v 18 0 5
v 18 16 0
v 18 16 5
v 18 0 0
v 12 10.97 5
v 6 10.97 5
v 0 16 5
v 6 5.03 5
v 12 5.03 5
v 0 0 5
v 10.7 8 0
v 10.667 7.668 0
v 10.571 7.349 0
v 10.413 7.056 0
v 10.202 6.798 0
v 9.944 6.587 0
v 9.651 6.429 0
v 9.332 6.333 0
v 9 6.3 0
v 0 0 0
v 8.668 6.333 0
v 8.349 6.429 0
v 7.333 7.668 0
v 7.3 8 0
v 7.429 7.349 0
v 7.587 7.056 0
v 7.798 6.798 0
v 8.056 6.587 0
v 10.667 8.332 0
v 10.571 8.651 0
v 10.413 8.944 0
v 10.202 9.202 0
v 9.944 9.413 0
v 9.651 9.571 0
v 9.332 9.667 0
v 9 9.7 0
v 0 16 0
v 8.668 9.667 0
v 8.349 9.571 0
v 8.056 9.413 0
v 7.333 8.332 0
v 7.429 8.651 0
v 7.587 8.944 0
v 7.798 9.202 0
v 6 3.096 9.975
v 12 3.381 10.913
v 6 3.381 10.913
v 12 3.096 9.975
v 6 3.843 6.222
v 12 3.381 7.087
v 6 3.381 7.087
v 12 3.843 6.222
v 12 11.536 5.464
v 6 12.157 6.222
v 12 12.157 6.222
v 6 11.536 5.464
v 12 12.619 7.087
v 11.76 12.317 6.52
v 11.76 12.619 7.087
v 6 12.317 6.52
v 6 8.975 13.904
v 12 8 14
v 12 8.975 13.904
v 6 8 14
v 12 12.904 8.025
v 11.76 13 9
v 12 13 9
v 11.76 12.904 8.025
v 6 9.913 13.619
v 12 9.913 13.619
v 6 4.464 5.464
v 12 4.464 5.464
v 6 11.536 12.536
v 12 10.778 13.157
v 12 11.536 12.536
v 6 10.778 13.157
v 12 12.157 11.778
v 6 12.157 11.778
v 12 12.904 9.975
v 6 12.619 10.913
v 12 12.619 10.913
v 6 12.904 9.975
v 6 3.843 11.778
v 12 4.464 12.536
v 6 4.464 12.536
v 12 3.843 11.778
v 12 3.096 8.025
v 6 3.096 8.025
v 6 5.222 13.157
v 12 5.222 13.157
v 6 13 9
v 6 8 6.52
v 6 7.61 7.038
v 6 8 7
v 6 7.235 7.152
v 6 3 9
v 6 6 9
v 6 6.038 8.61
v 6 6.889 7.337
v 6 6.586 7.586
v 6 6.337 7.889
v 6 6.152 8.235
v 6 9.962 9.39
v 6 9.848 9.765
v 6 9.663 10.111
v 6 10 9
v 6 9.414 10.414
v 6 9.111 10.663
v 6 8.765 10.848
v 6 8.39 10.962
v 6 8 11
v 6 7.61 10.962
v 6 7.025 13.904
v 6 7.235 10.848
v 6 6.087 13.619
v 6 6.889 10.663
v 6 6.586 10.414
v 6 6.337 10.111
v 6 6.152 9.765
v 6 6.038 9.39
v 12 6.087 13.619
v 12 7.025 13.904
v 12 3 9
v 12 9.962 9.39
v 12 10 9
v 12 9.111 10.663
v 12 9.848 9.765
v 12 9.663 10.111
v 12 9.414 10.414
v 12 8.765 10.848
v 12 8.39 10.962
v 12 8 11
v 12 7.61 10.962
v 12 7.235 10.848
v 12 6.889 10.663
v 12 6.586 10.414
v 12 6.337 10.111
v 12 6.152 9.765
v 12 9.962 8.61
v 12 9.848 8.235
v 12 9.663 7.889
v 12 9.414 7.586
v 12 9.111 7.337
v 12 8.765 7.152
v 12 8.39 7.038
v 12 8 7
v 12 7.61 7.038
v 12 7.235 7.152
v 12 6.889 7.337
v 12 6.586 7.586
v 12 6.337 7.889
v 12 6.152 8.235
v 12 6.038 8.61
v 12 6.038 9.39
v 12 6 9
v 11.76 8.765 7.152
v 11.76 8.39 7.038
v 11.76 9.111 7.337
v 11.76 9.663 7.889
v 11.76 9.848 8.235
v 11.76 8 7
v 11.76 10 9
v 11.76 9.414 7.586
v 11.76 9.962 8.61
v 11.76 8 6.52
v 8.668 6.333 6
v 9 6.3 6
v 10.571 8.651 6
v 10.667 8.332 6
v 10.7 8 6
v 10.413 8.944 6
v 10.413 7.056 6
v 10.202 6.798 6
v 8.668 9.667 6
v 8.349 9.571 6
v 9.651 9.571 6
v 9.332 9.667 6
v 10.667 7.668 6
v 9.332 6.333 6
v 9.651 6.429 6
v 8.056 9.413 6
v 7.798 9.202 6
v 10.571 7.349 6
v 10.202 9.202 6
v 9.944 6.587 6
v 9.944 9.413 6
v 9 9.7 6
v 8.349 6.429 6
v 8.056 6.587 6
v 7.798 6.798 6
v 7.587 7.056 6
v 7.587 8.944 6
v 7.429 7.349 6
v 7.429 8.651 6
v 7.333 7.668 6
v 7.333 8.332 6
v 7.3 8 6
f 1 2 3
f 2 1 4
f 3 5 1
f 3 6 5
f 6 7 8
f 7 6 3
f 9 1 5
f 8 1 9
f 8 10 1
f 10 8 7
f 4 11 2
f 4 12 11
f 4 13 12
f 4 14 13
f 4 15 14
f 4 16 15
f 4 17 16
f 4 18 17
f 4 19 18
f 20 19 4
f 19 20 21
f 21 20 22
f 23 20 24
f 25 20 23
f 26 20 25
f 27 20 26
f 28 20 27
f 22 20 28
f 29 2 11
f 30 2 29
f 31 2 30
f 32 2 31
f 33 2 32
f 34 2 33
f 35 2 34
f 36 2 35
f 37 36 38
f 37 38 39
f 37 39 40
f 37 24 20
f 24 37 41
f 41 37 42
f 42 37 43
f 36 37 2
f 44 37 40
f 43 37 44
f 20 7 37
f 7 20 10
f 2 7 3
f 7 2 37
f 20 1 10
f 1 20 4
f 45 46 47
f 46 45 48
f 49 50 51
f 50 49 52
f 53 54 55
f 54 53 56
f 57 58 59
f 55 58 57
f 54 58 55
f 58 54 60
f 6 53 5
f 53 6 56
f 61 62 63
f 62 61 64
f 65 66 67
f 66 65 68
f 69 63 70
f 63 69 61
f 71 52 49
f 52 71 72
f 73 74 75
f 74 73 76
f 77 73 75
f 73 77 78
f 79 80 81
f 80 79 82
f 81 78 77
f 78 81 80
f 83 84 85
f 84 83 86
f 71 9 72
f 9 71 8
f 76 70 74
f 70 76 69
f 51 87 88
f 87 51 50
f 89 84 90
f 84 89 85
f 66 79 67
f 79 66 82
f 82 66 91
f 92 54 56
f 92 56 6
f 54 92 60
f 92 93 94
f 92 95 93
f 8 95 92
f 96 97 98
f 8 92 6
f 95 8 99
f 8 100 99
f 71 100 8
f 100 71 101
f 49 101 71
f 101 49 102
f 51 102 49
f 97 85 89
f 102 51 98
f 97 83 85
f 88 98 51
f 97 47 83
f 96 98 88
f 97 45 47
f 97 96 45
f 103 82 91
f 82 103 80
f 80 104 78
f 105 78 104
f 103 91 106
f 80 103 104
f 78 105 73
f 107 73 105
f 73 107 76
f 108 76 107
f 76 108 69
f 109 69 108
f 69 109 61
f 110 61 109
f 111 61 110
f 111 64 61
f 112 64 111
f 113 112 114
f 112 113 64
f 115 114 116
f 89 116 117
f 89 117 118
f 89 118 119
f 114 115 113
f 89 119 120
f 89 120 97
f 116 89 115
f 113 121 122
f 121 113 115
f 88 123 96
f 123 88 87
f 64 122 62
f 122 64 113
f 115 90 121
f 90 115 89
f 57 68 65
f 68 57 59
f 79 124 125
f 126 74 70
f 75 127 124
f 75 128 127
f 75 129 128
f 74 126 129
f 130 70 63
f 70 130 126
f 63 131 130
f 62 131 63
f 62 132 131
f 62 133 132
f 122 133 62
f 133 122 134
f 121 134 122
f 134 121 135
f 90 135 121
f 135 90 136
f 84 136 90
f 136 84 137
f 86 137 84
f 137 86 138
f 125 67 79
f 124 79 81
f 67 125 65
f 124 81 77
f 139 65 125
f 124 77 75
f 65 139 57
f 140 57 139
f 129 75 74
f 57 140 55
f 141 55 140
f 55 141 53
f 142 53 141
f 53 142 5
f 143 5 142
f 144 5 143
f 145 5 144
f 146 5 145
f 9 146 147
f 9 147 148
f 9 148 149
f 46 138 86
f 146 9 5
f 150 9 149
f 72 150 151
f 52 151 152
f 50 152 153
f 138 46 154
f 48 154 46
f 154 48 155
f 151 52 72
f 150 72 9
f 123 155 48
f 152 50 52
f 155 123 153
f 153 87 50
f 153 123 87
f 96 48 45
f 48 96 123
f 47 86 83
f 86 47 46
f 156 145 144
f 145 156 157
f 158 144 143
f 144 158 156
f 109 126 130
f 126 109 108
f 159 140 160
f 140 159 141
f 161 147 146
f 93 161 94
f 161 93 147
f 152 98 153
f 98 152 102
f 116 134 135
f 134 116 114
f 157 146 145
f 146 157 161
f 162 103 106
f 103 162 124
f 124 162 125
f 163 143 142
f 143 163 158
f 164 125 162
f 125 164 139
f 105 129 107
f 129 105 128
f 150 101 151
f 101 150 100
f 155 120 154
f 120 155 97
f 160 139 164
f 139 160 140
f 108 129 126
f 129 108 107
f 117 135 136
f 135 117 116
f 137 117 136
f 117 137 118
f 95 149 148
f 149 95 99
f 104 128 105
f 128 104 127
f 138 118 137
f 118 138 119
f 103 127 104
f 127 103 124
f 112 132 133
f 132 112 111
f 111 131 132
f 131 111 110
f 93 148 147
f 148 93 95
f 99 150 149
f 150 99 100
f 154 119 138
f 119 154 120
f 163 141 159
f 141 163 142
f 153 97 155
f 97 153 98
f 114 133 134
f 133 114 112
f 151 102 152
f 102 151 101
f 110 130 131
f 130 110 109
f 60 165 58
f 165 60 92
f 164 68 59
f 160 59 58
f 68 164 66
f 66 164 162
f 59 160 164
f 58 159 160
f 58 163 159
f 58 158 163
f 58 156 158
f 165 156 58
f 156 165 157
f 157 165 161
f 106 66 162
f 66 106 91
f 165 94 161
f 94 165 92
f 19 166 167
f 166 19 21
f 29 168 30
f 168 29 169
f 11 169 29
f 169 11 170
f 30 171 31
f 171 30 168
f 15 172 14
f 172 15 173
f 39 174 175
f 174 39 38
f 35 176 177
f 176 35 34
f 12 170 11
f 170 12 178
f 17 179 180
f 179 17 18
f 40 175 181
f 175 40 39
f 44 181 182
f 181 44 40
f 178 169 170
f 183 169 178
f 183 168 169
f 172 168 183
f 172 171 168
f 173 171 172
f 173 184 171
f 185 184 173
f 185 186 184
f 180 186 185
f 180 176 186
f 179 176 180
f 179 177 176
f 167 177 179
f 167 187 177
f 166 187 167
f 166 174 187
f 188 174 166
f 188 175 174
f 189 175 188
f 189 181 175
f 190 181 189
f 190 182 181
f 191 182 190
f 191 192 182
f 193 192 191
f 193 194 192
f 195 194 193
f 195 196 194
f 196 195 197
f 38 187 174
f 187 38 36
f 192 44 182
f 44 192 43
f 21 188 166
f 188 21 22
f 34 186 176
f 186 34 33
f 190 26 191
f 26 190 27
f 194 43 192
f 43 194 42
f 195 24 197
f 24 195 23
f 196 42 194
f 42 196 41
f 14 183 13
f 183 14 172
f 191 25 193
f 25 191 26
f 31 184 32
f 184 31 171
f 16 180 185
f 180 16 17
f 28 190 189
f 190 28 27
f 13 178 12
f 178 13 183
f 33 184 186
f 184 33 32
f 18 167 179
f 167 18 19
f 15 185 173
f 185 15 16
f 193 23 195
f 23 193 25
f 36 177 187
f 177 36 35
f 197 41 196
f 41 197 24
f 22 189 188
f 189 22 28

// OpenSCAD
$fn = 32;

// ----------------------------------------------------------------------
// Cable clip: cable 4 mm, clamp 10 mm, base 18 mm
// ----------------------------------------------------------------------

// --- parameters (mm) ---
base_w = 18;              // base length, X
base_d = 16;              // base width, Y
base_t = 5;               // base thickness
clamp_d = 10;             // clamp outside diameter
wall_t = 3;               // clamp wall
cable_d = 4;              // cable opening
ring_w = 6;               // clamp width along the cable
screw_d = 3.4;            // screw clearance
throat = 2.48;            // snap throat width
sink = 1;                 // overlap of the clamp into the base

module base() {
  cube([base_w, base_d, base_t]);
}

module clamp() {
  translate([base_w / 2, base_d / 2, base_t + clamp_d / 2 - sink]) rotate([0, 90, 0])
    cylinder(h = ring_w, d = clamp_d, center = true);
}

difference() {
  union() {
    base();
    clamp();
  }
  translate([base_w / 2, base_d / 2, base_t + clamp_d / 2 - sink]) rotate([0, 90, 0]) translate([0, 0, -ring_w / 2 - 1]) cylinder(h = ring_w + 2, d = cable_d);
  /* snap throat: the opening is narrower than the cable */
  translate([base_w / 2 - throat / 2, base_d / 2, base_t + clamp_d / 2 - sink]) rotate([0, 90, 0]) translate([0, 0, -ring_w / 2 - 1]) cube([throat, clamp_d + 2, ring_w + 2]);
  translate([9, base_d / 2, -1]) cylinder(h = base_t + 2, d = screw_d);
}
